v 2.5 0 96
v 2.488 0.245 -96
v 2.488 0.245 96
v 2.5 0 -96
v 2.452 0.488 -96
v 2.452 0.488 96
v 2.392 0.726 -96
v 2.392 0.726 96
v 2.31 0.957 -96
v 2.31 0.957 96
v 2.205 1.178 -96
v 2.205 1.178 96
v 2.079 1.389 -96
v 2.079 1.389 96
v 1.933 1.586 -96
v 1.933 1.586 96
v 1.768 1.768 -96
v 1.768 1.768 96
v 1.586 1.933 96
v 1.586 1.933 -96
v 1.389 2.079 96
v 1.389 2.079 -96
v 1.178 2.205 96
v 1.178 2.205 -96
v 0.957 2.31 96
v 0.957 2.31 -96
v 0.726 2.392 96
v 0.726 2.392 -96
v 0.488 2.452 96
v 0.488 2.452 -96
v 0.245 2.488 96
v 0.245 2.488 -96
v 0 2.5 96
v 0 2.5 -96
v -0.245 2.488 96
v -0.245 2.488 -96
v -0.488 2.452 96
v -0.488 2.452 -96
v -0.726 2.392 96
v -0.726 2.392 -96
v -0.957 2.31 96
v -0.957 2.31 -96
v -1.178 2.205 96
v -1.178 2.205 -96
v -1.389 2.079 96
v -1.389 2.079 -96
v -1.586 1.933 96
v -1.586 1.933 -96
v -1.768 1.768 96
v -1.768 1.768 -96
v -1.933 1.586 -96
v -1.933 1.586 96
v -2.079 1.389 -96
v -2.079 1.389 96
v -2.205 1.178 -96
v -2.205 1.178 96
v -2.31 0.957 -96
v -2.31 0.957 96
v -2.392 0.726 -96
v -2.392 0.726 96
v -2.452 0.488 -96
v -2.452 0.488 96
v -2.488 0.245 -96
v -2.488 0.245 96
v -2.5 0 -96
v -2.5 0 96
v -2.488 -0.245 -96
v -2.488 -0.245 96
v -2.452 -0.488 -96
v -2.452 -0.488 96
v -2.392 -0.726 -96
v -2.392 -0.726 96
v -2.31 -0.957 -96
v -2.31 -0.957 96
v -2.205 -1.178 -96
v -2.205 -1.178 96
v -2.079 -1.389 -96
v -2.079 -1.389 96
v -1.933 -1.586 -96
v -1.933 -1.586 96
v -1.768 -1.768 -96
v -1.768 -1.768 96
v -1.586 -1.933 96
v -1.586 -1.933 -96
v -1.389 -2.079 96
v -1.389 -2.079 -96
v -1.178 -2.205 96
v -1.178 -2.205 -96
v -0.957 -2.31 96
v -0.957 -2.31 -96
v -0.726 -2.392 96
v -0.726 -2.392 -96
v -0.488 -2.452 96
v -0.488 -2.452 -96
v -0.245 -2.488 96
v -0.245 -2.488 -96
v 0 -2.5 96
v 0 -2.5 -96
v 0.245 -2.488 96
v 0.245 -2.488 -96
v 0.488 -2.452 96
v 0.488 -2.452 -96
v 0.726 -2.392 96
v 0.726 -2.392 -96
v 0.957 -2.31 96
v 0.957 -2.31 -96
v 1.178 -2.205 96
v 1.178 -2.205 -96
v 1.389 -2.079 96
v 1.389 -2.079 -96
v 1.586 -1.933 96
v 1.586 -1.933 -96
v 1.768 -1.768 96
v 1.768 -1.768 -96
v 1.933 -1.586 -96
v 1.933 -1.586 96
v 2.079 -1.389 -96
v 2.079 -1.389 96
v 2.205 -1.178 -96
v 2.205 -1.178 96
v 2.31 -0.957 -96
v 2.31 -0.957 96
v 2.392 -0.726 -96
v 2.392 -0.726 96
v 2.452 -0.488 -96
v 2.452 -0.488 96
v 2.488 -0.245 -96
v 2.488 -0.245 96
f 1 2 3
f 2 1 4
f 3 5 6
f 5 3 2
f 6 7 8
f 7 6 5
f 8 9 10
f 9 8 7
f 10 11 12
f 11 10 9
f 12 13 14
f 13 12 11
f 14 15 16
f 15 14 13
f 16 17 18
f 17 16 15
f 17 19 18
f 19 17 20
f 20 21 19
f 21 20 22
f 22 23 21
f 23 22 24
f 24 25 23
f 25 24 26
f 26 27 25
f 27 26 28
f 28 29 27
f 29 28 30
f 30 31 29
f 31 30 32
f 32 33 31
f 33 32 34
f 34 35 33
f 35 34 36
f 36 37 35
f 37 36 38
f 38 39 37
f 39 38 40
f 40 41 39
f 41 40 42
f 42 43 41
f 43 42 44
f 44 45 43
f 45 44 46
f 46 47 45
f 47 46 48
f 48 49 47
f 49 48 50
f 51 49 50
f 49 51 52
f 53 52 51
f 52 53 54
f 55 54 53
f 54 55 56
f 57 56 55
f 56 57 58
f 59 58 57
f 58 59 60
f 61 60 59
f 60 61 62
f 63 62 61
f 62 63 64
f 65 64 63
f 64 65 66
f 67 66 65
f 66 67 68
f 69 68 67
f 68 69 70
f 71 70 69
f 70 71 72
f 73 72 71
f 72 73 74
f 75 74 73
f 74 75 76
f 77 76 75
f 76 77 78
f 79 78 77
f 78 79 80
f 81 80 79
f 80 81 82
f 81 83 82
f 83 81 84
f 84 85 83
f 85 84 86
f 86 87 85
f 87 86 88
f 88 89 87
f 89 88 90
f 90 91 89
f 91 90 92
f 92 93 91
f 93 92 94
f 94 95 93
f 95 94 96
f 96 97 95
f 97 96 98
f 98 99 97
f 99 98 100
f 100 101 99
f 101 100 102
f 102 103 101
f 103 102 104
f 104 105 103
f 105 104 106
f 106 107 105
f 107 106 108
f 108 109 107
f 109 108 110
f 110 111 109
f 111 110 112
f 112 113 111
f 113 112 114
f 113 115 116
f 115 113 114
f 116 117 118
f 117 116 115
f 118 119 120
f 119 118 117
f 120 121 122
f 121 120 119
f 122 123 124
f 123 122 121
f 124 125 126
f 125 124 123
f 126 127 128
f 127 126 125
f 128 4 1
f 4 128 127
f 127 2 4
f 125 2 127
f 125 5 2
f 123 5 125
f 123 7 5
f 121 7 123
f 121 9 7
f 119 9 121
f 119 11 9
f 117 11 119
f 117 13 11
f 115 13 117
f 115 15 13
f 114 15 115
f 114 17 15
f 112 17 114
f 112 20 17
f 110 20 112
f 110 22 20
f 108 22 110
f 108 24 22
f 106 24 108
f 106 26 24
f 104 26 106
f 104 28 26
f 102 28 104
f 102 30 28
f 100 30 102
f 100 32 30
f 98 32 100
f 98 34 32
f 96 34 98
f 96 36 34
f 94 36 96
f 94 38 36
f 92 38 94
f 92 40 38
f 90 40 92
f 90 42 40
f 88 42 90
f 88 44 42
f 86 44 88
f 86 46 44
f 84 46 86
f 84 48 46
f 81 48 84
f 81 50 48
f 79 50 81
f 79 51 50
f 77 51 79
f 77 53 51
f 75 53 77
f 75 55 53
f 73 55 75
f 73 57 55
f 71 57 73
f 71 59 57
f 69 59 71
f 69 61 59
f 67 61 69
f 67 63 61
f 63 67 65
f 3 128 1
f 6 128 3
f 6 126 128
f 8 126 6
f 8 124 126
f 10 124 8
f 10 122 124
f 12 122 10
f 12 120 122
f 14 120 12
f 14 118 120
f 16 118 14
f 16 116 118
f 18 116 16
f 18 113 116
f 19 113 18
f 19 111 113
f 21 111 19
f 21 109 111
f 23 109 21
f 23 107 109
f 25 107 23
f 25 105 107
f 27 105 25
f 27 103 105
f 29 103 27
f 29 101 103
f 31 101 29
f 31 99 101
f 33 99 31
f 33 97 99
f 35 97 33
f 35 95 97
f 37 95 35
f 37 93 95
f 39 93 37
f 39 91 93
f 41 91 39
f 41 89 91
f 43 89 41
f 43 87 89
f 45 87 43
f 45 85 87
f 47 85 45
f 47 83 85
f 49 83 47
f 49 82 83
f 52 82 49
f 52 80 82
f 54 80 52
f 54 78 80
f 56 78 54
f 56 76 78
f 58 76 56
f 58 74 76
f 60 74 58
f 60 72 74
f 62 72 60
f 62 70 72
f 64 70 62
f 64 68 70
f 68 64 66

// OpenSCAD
$fn = 64;
length = 192;
dia = 5.0;

cylinder(h=length, r=dia/2, center=true);
